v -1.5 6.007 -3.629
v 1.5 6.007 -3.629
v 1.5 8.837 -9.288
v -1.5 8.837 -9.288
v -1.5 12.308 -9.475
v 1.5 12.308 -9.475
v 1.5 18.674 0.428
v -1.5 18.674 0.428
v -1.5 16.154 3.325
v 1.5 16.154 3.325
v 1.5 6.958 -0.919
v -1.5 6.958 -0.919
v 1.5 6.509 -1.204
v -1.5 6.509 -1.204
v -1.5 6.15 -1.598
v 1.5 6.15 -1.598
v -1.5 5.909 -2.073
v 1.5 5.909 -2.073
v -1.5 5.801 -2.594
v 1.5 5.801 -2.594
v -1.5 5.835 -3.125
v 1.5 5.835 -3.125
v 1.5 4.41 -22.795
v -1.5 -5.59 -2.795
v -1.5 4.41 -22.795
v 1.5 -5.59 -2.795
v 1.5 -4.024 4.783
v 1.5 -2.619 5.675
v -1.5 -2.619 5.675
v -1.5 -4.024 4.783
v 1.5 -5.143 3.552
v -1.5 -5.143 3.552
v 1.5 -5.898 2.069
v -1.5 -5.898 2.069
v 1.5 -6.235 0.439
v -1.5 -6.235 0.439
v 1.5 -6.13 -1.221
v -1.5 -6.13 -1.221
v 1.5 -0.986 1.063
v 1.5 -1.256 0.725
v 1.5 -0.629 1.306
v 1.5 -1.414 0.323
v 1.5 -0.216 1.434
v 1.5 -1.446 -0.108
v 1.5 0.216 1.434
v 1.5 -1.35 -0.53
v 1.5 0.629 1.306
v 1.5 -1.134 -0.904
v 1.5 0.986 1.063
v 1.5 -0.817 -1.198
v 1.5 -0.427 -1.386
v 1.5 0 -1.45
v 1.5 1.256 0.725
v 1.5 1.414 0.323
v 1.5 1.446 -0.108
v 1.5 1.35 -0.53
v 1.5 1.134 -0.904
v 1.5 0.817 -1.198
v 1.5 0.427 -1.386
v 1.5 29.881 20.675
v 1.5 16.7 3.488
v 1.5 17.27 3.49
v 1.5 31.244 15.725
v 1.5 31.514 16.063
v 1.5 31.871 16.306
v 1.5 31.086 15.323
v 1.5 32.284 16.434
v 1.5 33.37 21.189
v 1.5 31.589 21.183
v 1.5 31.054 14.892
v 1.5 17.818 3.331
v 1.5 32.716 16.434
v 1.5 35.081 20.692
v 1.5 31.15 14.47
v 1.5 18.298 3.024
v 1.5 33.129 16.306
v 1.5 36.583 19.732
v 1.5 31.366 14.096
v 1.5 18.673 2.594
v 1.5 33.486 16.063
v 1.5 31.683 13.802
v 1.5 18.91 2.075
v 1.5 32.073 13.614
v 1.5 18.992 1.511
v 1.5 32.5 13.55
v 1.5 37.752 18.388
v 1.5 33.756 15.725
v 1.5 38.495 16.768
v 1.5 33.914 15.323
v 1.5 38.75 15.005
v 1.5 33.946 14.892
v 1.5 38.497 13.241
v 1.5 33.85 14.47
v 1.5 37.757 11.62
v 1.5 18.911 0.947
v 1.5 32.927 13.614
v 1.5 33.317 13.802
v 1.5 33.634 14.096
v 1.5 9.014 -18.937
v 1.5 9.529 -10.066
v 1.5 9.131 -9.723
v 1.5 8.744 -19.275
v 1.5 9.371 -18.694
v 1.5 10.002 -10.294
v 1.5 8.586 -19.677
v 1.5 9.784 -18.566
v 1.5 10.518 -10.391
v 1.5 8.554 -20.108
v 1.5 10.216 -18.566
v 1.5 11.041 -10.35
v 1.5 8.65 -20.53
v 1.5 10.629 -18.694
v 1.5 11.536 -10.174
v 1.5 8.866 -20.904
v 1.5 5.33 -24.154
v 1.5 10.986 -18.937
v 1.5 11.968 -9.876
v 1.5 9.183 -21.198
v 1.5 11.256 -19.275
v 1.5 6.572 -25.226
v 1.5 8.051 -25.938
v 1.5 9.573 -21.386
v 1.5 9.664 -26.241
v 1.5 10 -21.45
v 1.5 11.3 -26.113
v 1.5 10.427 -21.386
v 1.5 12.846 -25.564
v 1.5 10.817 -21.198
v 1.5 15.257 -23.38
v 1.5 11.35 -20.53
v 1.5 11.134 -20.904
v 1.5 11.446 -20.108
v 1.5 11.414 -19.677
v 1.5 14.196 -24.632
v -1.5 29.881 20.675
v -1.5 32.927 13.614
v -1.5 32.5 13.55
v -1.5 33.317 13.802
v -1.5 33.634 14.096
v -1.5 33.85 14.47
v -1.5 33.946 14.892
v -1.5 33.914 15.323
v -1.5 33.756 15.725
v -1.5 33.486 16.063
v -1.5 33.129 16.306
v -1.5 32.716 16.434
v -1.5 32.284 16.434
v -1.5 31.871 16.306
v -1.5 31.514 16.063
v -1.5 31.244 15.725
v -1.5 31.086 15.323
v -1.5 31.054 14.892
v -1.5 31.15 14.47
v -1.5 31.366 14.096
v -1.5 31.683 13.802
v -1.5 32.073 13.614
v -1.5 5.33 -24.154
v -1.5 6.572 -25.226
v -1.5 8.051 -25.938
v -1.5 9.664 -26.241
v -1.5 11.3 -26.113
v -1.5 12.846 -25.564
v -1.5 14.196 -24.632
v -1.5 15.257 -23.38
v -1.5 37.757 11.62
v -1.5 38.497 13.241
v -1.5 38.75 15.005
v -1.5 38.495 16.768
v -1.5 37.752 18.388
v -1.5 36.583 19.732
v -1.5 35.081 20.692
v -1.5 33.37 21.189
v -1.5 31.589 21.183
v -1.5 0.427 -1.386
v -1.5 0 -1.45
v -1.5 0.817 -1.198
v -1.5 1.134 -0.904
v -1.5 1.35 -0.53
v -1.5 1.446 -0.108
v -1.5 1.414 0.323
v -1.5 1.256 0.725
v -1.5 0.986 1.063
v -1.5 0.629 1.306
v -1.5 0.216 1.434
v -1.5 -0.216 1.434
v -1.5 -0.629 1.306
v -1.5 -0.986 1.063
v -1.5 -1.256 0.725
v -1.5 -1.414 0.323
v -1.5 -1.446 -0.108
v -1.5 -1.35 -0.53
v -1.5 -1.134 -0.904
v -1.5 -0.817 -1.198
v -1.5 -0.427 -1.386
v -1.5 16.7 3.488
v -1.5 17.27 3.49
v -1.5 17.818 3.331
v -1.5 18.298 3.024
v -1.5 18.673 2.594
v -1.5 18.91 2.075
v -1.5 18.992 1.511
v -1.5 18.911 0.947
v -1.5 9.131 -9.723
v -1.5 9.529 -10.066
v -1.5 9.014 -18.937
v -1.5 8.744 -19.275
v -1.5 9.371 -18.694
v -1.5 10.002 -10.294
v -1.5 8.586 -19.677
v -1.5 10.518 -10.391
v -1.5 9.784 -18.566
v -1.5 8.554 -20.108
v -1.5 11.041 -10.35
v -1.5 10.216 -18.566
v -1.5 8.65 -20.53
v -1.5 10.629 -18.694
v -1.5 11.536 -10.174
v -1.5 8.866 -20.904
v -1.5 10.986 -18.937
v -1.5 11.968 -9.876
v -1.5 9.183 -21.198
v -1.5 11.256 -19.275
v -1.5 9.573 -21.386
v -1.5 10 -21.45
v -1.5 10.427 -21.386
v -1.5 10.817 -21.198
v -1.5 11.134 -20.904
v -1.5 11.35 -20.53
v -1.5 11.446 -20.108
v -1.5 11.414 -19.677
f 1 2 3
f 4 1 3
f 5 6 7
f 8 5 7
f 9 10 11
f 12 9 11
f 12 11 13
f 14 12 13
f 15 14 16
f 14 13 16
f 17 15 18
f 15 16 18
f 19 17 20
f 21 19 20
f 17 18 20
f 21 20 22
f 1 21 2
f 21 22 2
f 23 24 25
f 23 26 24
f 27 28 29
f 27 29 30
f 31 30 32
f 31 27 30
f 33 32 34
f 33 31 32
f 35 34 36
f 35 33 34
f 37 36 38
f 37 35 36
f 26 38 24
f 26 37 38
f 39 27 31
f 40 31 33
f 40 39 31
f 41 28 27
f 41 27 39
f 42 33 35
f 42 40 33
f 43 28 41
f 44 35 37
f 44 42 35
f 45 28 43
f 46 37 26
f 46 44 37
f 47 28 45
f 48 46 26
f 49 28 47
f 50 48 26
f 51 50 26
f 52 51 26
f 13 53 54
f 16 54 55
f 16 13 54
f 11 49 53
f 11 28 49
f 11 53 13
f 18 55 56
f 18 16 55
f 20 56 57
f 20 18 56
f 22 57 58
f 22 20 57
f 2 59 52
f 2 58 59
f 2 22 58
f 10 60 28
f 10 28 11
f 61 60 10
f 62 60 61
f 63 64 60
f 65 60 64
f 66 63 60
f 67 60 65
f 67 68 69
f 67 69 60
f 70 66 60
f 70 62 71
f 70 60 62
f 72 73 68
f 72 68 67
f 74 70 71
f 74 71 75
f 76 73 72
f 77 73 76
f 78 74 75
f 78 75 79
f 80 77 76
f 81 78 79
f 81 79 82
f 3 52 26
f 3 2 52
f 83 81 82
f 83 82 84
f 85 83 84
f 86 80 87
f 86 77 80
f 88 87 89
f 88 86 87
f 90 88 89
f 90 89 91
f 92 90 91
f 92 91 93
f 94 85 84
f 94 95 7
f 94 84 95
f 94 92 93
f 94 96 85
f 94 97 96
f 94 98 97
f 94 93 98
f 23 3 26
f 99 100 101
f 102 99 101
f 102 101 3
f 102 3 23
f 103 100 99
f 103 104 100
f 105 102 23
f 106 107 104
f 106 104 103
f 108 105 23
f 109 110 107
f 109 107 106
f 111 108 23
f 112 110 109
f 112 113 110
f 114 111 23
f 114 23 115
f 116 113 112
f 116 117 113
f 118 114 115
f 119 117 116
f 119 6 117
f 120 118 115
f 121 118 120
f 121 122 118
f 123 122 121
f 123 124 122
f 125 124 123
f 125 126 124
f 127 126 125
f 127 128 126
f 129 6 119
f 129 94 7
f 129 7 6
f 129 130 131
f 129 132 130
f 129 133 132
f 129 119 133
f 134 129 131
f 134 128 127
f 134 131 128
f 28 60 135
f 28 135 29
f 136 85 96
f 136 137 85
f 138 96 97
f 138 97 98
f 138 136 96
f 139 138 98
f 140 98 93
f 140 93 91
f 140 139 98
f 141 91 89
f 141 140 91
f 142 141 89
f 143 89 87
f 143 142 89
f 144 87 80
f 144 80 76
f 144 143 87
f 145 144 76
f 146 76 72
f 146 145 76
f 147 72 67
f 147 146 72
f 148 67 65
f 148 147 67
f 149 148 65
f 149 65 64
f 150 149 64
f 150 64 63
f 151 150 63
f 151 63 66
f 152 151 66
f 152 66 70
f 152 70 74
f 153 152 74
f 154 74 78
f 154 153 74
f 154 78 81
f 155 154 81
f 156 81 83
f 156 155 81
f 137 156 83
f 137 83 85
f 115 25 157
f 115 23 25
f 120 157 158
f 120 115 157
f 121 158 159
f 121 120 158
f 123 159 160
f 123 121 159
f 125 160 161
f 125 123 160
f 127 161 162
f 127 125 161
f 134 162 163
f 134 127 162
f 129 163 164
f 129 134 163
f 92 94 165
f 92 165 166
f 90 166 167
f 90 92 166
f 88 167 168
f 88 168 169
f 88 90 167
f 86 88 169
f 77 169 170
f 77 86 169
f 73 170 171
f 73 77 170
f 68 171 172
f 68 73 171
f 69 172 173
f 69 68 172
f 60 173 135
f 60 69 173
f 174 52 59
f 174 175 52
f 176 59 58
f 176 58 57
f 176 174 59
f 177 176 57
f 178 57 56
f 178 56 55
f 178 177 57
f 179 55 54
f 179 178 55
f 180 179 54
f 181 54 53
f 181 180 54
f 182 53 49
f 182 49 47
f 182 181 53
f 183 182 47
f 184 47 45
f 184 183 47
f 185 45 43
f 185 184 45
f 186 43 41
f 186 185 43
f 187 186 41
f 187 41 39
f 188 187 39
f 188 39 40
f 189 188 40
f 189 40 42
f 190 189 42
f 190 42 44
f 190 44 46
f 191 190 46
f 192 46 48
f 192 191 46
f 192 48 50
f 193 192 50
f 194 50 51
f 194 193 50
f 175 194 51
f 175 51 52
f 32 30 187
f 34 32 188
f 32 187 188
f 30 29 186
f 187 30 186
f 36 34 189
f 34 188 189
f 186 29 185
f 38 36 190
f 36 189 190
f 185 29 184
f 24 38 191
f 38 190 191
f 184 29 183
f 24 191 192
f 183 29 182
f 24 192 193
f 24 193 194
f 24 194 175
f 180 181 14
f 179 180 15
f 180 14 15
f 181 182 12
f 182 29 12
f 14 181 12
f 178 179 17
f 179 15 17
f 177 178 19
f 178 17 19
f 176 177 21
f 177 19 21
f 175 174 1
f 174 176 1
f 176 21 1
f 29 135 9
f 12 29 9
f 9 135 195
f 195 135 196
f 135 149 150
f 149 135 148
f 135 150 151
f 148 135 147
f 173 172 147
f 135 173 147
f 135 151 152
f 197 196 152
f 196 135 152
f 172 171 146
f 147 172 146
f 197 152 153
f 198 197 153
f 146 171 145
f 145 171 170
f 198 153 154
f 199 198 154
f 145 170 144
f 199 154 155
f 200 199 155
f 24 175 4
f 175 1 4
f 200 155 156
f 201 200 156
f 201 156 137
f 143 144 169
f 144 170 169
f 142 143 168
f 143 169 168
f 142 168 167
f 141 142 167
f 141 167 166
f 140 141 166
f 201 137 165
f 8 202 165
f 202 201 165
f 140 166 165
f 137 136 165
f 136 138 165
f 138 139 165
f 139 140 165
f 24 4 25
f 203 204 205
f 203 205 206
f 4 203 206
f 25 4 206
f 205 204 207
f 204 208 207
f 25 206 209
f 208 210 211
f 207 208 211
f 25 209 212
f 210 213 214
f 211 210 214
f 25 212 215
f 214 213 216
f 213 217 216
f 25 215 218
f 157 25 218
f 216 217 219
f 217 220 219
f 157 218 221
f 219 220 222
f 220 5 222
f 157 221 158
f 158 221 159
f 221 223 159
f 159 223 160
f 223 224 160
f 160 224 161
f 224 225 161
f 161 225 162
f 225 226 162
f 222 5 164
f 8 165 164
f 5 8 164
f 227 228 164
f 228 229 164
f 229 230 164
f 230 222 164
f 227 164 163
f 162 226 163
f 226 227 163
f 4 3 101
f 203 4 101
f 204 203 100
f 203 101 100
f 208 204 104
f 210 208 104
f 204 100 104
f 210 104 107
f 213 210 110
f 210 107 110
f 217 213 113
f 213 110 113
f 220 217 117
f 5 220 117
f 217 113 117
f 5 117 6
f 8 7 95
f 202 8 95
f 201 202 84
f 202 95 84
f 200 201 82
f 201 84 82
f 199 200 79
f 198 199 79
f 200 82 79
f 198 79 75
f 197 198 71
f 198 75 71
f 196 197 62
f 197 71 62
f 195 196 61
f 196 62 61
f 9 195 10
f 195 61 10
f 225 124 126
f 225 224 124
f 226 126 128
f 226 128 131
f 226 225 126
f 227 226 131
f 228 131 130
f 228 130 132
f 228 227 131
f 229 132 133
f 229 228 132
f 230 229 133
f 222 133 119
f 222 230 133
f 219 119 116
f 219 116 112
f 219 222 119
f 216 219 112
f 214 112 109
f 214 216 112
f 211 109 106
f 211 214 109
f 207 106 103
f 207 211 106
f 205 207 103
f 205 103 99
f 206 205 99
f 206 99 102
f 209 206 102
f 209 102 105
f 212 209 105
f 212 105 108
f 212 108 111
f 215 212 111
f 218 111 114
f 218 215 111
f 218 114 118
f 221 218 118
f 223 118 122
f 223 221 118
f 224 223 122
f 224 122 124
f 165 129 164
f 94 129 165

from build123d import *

# Parameters (mm, degrees)
SKETCH1_R           = 6.25
SKETCH1_R_2         = 1.45
BOSS_EXTRUDE1_DEPTH = 1.5
CUT_EXTRUDE1_DEPTH  = 3


with BuildPart() as part:
    # Sketch1 → Boss-Extrude1 (new body, symmetric)
    with BuildSketch(Plane(origin=(0, 0, 0), x_dir=(0, 0, -1), z_dir=(1, 0, 0))):
        with Locations((20, 10.000000011)):
            Circle(SKETCH1_R)
        with Locations((20, 10.000000011)):
            Circle(SKETCH1_R_2, mode=Mode.SUBTRACT)
        with BuildLine():
            ThreePointArc((-8.75, 32.5), (-13.659228479, 26.395507251), (-20.674746153, 29.880886391))
            Line((-20.674746153, 29.880886391), (-5.674746153, -2.619113609))
            ThreePointArc((-5.674746153, -2.619113609), (-1.340771521, 6.104492749), (6.25, 0))
            ThreePointArc((6.25, 0), (5.316567553, -3.28581945), (2.795084974, -5.590169942))
            Line((2.795084974, -5.590169942), (22.795084974, 4.409830069))
            ThreePointArc((22.795084974, 4.409830069), (13.759058052, 10.336368263), (23.379734945, 15.257365483))
            Line((23.379734945, 15.257365483), (-11.620265055, 37.757365472))
            ThreePointArc((-11.620265055, 37.757365472), (-9.514298431, 35.494925425), (-8.75, 32.5))
        make_face()
        Circle(SKETCH1_R)
        Circle(SKETCH1_R_2, mode=Mode.SUBTRACT)
        with Locations((-15, 32.5)):
            Circle(SKETCH1_R)
        with Locations((-15, 32.5)):
            Circle(SKETCH1_R_2, mode=Mode.SUBTRACT)
    extrude(amount=BOSS_EXTRUDE1_DEPTH, both=True)

    # Sketch2 → Cut-Extrude1 (cut)
    with BuildSketch(Plane(origin=(1.5, 0, 0), x_dir=(0, 0, -1), z_dir=(1, 0, 0))):
        with BuildLine():
            Line((3.629133347, 6.007194134), (9.288126649, 8.836690789))
            ThreePointArc((9.288126649, 8.836690789), (10.390800881, 10.51790733), (9.47521464, 12.307902121))
            Line((9.47521464, 12.307902121), (-0.428023639, 18.674269583))
            ThreePointArc((-0.428023639, 18.674269583), (-2.822182558, 18.500874667), (-3.32545759, 16.153796277))
            Line((-3.32545759, 16.153796277), (0.918787386, 6.957932161))
            ThreePointArc((0.918787386, 6.957932161), (2.072692273, 5.908791877), (3.629133347, 6.007194134))
        make_face()
    extrude(amount=-CUT_EXTRUDE1_DEPTH, mode=Mode.SUBTRACT)


solid = part.part
